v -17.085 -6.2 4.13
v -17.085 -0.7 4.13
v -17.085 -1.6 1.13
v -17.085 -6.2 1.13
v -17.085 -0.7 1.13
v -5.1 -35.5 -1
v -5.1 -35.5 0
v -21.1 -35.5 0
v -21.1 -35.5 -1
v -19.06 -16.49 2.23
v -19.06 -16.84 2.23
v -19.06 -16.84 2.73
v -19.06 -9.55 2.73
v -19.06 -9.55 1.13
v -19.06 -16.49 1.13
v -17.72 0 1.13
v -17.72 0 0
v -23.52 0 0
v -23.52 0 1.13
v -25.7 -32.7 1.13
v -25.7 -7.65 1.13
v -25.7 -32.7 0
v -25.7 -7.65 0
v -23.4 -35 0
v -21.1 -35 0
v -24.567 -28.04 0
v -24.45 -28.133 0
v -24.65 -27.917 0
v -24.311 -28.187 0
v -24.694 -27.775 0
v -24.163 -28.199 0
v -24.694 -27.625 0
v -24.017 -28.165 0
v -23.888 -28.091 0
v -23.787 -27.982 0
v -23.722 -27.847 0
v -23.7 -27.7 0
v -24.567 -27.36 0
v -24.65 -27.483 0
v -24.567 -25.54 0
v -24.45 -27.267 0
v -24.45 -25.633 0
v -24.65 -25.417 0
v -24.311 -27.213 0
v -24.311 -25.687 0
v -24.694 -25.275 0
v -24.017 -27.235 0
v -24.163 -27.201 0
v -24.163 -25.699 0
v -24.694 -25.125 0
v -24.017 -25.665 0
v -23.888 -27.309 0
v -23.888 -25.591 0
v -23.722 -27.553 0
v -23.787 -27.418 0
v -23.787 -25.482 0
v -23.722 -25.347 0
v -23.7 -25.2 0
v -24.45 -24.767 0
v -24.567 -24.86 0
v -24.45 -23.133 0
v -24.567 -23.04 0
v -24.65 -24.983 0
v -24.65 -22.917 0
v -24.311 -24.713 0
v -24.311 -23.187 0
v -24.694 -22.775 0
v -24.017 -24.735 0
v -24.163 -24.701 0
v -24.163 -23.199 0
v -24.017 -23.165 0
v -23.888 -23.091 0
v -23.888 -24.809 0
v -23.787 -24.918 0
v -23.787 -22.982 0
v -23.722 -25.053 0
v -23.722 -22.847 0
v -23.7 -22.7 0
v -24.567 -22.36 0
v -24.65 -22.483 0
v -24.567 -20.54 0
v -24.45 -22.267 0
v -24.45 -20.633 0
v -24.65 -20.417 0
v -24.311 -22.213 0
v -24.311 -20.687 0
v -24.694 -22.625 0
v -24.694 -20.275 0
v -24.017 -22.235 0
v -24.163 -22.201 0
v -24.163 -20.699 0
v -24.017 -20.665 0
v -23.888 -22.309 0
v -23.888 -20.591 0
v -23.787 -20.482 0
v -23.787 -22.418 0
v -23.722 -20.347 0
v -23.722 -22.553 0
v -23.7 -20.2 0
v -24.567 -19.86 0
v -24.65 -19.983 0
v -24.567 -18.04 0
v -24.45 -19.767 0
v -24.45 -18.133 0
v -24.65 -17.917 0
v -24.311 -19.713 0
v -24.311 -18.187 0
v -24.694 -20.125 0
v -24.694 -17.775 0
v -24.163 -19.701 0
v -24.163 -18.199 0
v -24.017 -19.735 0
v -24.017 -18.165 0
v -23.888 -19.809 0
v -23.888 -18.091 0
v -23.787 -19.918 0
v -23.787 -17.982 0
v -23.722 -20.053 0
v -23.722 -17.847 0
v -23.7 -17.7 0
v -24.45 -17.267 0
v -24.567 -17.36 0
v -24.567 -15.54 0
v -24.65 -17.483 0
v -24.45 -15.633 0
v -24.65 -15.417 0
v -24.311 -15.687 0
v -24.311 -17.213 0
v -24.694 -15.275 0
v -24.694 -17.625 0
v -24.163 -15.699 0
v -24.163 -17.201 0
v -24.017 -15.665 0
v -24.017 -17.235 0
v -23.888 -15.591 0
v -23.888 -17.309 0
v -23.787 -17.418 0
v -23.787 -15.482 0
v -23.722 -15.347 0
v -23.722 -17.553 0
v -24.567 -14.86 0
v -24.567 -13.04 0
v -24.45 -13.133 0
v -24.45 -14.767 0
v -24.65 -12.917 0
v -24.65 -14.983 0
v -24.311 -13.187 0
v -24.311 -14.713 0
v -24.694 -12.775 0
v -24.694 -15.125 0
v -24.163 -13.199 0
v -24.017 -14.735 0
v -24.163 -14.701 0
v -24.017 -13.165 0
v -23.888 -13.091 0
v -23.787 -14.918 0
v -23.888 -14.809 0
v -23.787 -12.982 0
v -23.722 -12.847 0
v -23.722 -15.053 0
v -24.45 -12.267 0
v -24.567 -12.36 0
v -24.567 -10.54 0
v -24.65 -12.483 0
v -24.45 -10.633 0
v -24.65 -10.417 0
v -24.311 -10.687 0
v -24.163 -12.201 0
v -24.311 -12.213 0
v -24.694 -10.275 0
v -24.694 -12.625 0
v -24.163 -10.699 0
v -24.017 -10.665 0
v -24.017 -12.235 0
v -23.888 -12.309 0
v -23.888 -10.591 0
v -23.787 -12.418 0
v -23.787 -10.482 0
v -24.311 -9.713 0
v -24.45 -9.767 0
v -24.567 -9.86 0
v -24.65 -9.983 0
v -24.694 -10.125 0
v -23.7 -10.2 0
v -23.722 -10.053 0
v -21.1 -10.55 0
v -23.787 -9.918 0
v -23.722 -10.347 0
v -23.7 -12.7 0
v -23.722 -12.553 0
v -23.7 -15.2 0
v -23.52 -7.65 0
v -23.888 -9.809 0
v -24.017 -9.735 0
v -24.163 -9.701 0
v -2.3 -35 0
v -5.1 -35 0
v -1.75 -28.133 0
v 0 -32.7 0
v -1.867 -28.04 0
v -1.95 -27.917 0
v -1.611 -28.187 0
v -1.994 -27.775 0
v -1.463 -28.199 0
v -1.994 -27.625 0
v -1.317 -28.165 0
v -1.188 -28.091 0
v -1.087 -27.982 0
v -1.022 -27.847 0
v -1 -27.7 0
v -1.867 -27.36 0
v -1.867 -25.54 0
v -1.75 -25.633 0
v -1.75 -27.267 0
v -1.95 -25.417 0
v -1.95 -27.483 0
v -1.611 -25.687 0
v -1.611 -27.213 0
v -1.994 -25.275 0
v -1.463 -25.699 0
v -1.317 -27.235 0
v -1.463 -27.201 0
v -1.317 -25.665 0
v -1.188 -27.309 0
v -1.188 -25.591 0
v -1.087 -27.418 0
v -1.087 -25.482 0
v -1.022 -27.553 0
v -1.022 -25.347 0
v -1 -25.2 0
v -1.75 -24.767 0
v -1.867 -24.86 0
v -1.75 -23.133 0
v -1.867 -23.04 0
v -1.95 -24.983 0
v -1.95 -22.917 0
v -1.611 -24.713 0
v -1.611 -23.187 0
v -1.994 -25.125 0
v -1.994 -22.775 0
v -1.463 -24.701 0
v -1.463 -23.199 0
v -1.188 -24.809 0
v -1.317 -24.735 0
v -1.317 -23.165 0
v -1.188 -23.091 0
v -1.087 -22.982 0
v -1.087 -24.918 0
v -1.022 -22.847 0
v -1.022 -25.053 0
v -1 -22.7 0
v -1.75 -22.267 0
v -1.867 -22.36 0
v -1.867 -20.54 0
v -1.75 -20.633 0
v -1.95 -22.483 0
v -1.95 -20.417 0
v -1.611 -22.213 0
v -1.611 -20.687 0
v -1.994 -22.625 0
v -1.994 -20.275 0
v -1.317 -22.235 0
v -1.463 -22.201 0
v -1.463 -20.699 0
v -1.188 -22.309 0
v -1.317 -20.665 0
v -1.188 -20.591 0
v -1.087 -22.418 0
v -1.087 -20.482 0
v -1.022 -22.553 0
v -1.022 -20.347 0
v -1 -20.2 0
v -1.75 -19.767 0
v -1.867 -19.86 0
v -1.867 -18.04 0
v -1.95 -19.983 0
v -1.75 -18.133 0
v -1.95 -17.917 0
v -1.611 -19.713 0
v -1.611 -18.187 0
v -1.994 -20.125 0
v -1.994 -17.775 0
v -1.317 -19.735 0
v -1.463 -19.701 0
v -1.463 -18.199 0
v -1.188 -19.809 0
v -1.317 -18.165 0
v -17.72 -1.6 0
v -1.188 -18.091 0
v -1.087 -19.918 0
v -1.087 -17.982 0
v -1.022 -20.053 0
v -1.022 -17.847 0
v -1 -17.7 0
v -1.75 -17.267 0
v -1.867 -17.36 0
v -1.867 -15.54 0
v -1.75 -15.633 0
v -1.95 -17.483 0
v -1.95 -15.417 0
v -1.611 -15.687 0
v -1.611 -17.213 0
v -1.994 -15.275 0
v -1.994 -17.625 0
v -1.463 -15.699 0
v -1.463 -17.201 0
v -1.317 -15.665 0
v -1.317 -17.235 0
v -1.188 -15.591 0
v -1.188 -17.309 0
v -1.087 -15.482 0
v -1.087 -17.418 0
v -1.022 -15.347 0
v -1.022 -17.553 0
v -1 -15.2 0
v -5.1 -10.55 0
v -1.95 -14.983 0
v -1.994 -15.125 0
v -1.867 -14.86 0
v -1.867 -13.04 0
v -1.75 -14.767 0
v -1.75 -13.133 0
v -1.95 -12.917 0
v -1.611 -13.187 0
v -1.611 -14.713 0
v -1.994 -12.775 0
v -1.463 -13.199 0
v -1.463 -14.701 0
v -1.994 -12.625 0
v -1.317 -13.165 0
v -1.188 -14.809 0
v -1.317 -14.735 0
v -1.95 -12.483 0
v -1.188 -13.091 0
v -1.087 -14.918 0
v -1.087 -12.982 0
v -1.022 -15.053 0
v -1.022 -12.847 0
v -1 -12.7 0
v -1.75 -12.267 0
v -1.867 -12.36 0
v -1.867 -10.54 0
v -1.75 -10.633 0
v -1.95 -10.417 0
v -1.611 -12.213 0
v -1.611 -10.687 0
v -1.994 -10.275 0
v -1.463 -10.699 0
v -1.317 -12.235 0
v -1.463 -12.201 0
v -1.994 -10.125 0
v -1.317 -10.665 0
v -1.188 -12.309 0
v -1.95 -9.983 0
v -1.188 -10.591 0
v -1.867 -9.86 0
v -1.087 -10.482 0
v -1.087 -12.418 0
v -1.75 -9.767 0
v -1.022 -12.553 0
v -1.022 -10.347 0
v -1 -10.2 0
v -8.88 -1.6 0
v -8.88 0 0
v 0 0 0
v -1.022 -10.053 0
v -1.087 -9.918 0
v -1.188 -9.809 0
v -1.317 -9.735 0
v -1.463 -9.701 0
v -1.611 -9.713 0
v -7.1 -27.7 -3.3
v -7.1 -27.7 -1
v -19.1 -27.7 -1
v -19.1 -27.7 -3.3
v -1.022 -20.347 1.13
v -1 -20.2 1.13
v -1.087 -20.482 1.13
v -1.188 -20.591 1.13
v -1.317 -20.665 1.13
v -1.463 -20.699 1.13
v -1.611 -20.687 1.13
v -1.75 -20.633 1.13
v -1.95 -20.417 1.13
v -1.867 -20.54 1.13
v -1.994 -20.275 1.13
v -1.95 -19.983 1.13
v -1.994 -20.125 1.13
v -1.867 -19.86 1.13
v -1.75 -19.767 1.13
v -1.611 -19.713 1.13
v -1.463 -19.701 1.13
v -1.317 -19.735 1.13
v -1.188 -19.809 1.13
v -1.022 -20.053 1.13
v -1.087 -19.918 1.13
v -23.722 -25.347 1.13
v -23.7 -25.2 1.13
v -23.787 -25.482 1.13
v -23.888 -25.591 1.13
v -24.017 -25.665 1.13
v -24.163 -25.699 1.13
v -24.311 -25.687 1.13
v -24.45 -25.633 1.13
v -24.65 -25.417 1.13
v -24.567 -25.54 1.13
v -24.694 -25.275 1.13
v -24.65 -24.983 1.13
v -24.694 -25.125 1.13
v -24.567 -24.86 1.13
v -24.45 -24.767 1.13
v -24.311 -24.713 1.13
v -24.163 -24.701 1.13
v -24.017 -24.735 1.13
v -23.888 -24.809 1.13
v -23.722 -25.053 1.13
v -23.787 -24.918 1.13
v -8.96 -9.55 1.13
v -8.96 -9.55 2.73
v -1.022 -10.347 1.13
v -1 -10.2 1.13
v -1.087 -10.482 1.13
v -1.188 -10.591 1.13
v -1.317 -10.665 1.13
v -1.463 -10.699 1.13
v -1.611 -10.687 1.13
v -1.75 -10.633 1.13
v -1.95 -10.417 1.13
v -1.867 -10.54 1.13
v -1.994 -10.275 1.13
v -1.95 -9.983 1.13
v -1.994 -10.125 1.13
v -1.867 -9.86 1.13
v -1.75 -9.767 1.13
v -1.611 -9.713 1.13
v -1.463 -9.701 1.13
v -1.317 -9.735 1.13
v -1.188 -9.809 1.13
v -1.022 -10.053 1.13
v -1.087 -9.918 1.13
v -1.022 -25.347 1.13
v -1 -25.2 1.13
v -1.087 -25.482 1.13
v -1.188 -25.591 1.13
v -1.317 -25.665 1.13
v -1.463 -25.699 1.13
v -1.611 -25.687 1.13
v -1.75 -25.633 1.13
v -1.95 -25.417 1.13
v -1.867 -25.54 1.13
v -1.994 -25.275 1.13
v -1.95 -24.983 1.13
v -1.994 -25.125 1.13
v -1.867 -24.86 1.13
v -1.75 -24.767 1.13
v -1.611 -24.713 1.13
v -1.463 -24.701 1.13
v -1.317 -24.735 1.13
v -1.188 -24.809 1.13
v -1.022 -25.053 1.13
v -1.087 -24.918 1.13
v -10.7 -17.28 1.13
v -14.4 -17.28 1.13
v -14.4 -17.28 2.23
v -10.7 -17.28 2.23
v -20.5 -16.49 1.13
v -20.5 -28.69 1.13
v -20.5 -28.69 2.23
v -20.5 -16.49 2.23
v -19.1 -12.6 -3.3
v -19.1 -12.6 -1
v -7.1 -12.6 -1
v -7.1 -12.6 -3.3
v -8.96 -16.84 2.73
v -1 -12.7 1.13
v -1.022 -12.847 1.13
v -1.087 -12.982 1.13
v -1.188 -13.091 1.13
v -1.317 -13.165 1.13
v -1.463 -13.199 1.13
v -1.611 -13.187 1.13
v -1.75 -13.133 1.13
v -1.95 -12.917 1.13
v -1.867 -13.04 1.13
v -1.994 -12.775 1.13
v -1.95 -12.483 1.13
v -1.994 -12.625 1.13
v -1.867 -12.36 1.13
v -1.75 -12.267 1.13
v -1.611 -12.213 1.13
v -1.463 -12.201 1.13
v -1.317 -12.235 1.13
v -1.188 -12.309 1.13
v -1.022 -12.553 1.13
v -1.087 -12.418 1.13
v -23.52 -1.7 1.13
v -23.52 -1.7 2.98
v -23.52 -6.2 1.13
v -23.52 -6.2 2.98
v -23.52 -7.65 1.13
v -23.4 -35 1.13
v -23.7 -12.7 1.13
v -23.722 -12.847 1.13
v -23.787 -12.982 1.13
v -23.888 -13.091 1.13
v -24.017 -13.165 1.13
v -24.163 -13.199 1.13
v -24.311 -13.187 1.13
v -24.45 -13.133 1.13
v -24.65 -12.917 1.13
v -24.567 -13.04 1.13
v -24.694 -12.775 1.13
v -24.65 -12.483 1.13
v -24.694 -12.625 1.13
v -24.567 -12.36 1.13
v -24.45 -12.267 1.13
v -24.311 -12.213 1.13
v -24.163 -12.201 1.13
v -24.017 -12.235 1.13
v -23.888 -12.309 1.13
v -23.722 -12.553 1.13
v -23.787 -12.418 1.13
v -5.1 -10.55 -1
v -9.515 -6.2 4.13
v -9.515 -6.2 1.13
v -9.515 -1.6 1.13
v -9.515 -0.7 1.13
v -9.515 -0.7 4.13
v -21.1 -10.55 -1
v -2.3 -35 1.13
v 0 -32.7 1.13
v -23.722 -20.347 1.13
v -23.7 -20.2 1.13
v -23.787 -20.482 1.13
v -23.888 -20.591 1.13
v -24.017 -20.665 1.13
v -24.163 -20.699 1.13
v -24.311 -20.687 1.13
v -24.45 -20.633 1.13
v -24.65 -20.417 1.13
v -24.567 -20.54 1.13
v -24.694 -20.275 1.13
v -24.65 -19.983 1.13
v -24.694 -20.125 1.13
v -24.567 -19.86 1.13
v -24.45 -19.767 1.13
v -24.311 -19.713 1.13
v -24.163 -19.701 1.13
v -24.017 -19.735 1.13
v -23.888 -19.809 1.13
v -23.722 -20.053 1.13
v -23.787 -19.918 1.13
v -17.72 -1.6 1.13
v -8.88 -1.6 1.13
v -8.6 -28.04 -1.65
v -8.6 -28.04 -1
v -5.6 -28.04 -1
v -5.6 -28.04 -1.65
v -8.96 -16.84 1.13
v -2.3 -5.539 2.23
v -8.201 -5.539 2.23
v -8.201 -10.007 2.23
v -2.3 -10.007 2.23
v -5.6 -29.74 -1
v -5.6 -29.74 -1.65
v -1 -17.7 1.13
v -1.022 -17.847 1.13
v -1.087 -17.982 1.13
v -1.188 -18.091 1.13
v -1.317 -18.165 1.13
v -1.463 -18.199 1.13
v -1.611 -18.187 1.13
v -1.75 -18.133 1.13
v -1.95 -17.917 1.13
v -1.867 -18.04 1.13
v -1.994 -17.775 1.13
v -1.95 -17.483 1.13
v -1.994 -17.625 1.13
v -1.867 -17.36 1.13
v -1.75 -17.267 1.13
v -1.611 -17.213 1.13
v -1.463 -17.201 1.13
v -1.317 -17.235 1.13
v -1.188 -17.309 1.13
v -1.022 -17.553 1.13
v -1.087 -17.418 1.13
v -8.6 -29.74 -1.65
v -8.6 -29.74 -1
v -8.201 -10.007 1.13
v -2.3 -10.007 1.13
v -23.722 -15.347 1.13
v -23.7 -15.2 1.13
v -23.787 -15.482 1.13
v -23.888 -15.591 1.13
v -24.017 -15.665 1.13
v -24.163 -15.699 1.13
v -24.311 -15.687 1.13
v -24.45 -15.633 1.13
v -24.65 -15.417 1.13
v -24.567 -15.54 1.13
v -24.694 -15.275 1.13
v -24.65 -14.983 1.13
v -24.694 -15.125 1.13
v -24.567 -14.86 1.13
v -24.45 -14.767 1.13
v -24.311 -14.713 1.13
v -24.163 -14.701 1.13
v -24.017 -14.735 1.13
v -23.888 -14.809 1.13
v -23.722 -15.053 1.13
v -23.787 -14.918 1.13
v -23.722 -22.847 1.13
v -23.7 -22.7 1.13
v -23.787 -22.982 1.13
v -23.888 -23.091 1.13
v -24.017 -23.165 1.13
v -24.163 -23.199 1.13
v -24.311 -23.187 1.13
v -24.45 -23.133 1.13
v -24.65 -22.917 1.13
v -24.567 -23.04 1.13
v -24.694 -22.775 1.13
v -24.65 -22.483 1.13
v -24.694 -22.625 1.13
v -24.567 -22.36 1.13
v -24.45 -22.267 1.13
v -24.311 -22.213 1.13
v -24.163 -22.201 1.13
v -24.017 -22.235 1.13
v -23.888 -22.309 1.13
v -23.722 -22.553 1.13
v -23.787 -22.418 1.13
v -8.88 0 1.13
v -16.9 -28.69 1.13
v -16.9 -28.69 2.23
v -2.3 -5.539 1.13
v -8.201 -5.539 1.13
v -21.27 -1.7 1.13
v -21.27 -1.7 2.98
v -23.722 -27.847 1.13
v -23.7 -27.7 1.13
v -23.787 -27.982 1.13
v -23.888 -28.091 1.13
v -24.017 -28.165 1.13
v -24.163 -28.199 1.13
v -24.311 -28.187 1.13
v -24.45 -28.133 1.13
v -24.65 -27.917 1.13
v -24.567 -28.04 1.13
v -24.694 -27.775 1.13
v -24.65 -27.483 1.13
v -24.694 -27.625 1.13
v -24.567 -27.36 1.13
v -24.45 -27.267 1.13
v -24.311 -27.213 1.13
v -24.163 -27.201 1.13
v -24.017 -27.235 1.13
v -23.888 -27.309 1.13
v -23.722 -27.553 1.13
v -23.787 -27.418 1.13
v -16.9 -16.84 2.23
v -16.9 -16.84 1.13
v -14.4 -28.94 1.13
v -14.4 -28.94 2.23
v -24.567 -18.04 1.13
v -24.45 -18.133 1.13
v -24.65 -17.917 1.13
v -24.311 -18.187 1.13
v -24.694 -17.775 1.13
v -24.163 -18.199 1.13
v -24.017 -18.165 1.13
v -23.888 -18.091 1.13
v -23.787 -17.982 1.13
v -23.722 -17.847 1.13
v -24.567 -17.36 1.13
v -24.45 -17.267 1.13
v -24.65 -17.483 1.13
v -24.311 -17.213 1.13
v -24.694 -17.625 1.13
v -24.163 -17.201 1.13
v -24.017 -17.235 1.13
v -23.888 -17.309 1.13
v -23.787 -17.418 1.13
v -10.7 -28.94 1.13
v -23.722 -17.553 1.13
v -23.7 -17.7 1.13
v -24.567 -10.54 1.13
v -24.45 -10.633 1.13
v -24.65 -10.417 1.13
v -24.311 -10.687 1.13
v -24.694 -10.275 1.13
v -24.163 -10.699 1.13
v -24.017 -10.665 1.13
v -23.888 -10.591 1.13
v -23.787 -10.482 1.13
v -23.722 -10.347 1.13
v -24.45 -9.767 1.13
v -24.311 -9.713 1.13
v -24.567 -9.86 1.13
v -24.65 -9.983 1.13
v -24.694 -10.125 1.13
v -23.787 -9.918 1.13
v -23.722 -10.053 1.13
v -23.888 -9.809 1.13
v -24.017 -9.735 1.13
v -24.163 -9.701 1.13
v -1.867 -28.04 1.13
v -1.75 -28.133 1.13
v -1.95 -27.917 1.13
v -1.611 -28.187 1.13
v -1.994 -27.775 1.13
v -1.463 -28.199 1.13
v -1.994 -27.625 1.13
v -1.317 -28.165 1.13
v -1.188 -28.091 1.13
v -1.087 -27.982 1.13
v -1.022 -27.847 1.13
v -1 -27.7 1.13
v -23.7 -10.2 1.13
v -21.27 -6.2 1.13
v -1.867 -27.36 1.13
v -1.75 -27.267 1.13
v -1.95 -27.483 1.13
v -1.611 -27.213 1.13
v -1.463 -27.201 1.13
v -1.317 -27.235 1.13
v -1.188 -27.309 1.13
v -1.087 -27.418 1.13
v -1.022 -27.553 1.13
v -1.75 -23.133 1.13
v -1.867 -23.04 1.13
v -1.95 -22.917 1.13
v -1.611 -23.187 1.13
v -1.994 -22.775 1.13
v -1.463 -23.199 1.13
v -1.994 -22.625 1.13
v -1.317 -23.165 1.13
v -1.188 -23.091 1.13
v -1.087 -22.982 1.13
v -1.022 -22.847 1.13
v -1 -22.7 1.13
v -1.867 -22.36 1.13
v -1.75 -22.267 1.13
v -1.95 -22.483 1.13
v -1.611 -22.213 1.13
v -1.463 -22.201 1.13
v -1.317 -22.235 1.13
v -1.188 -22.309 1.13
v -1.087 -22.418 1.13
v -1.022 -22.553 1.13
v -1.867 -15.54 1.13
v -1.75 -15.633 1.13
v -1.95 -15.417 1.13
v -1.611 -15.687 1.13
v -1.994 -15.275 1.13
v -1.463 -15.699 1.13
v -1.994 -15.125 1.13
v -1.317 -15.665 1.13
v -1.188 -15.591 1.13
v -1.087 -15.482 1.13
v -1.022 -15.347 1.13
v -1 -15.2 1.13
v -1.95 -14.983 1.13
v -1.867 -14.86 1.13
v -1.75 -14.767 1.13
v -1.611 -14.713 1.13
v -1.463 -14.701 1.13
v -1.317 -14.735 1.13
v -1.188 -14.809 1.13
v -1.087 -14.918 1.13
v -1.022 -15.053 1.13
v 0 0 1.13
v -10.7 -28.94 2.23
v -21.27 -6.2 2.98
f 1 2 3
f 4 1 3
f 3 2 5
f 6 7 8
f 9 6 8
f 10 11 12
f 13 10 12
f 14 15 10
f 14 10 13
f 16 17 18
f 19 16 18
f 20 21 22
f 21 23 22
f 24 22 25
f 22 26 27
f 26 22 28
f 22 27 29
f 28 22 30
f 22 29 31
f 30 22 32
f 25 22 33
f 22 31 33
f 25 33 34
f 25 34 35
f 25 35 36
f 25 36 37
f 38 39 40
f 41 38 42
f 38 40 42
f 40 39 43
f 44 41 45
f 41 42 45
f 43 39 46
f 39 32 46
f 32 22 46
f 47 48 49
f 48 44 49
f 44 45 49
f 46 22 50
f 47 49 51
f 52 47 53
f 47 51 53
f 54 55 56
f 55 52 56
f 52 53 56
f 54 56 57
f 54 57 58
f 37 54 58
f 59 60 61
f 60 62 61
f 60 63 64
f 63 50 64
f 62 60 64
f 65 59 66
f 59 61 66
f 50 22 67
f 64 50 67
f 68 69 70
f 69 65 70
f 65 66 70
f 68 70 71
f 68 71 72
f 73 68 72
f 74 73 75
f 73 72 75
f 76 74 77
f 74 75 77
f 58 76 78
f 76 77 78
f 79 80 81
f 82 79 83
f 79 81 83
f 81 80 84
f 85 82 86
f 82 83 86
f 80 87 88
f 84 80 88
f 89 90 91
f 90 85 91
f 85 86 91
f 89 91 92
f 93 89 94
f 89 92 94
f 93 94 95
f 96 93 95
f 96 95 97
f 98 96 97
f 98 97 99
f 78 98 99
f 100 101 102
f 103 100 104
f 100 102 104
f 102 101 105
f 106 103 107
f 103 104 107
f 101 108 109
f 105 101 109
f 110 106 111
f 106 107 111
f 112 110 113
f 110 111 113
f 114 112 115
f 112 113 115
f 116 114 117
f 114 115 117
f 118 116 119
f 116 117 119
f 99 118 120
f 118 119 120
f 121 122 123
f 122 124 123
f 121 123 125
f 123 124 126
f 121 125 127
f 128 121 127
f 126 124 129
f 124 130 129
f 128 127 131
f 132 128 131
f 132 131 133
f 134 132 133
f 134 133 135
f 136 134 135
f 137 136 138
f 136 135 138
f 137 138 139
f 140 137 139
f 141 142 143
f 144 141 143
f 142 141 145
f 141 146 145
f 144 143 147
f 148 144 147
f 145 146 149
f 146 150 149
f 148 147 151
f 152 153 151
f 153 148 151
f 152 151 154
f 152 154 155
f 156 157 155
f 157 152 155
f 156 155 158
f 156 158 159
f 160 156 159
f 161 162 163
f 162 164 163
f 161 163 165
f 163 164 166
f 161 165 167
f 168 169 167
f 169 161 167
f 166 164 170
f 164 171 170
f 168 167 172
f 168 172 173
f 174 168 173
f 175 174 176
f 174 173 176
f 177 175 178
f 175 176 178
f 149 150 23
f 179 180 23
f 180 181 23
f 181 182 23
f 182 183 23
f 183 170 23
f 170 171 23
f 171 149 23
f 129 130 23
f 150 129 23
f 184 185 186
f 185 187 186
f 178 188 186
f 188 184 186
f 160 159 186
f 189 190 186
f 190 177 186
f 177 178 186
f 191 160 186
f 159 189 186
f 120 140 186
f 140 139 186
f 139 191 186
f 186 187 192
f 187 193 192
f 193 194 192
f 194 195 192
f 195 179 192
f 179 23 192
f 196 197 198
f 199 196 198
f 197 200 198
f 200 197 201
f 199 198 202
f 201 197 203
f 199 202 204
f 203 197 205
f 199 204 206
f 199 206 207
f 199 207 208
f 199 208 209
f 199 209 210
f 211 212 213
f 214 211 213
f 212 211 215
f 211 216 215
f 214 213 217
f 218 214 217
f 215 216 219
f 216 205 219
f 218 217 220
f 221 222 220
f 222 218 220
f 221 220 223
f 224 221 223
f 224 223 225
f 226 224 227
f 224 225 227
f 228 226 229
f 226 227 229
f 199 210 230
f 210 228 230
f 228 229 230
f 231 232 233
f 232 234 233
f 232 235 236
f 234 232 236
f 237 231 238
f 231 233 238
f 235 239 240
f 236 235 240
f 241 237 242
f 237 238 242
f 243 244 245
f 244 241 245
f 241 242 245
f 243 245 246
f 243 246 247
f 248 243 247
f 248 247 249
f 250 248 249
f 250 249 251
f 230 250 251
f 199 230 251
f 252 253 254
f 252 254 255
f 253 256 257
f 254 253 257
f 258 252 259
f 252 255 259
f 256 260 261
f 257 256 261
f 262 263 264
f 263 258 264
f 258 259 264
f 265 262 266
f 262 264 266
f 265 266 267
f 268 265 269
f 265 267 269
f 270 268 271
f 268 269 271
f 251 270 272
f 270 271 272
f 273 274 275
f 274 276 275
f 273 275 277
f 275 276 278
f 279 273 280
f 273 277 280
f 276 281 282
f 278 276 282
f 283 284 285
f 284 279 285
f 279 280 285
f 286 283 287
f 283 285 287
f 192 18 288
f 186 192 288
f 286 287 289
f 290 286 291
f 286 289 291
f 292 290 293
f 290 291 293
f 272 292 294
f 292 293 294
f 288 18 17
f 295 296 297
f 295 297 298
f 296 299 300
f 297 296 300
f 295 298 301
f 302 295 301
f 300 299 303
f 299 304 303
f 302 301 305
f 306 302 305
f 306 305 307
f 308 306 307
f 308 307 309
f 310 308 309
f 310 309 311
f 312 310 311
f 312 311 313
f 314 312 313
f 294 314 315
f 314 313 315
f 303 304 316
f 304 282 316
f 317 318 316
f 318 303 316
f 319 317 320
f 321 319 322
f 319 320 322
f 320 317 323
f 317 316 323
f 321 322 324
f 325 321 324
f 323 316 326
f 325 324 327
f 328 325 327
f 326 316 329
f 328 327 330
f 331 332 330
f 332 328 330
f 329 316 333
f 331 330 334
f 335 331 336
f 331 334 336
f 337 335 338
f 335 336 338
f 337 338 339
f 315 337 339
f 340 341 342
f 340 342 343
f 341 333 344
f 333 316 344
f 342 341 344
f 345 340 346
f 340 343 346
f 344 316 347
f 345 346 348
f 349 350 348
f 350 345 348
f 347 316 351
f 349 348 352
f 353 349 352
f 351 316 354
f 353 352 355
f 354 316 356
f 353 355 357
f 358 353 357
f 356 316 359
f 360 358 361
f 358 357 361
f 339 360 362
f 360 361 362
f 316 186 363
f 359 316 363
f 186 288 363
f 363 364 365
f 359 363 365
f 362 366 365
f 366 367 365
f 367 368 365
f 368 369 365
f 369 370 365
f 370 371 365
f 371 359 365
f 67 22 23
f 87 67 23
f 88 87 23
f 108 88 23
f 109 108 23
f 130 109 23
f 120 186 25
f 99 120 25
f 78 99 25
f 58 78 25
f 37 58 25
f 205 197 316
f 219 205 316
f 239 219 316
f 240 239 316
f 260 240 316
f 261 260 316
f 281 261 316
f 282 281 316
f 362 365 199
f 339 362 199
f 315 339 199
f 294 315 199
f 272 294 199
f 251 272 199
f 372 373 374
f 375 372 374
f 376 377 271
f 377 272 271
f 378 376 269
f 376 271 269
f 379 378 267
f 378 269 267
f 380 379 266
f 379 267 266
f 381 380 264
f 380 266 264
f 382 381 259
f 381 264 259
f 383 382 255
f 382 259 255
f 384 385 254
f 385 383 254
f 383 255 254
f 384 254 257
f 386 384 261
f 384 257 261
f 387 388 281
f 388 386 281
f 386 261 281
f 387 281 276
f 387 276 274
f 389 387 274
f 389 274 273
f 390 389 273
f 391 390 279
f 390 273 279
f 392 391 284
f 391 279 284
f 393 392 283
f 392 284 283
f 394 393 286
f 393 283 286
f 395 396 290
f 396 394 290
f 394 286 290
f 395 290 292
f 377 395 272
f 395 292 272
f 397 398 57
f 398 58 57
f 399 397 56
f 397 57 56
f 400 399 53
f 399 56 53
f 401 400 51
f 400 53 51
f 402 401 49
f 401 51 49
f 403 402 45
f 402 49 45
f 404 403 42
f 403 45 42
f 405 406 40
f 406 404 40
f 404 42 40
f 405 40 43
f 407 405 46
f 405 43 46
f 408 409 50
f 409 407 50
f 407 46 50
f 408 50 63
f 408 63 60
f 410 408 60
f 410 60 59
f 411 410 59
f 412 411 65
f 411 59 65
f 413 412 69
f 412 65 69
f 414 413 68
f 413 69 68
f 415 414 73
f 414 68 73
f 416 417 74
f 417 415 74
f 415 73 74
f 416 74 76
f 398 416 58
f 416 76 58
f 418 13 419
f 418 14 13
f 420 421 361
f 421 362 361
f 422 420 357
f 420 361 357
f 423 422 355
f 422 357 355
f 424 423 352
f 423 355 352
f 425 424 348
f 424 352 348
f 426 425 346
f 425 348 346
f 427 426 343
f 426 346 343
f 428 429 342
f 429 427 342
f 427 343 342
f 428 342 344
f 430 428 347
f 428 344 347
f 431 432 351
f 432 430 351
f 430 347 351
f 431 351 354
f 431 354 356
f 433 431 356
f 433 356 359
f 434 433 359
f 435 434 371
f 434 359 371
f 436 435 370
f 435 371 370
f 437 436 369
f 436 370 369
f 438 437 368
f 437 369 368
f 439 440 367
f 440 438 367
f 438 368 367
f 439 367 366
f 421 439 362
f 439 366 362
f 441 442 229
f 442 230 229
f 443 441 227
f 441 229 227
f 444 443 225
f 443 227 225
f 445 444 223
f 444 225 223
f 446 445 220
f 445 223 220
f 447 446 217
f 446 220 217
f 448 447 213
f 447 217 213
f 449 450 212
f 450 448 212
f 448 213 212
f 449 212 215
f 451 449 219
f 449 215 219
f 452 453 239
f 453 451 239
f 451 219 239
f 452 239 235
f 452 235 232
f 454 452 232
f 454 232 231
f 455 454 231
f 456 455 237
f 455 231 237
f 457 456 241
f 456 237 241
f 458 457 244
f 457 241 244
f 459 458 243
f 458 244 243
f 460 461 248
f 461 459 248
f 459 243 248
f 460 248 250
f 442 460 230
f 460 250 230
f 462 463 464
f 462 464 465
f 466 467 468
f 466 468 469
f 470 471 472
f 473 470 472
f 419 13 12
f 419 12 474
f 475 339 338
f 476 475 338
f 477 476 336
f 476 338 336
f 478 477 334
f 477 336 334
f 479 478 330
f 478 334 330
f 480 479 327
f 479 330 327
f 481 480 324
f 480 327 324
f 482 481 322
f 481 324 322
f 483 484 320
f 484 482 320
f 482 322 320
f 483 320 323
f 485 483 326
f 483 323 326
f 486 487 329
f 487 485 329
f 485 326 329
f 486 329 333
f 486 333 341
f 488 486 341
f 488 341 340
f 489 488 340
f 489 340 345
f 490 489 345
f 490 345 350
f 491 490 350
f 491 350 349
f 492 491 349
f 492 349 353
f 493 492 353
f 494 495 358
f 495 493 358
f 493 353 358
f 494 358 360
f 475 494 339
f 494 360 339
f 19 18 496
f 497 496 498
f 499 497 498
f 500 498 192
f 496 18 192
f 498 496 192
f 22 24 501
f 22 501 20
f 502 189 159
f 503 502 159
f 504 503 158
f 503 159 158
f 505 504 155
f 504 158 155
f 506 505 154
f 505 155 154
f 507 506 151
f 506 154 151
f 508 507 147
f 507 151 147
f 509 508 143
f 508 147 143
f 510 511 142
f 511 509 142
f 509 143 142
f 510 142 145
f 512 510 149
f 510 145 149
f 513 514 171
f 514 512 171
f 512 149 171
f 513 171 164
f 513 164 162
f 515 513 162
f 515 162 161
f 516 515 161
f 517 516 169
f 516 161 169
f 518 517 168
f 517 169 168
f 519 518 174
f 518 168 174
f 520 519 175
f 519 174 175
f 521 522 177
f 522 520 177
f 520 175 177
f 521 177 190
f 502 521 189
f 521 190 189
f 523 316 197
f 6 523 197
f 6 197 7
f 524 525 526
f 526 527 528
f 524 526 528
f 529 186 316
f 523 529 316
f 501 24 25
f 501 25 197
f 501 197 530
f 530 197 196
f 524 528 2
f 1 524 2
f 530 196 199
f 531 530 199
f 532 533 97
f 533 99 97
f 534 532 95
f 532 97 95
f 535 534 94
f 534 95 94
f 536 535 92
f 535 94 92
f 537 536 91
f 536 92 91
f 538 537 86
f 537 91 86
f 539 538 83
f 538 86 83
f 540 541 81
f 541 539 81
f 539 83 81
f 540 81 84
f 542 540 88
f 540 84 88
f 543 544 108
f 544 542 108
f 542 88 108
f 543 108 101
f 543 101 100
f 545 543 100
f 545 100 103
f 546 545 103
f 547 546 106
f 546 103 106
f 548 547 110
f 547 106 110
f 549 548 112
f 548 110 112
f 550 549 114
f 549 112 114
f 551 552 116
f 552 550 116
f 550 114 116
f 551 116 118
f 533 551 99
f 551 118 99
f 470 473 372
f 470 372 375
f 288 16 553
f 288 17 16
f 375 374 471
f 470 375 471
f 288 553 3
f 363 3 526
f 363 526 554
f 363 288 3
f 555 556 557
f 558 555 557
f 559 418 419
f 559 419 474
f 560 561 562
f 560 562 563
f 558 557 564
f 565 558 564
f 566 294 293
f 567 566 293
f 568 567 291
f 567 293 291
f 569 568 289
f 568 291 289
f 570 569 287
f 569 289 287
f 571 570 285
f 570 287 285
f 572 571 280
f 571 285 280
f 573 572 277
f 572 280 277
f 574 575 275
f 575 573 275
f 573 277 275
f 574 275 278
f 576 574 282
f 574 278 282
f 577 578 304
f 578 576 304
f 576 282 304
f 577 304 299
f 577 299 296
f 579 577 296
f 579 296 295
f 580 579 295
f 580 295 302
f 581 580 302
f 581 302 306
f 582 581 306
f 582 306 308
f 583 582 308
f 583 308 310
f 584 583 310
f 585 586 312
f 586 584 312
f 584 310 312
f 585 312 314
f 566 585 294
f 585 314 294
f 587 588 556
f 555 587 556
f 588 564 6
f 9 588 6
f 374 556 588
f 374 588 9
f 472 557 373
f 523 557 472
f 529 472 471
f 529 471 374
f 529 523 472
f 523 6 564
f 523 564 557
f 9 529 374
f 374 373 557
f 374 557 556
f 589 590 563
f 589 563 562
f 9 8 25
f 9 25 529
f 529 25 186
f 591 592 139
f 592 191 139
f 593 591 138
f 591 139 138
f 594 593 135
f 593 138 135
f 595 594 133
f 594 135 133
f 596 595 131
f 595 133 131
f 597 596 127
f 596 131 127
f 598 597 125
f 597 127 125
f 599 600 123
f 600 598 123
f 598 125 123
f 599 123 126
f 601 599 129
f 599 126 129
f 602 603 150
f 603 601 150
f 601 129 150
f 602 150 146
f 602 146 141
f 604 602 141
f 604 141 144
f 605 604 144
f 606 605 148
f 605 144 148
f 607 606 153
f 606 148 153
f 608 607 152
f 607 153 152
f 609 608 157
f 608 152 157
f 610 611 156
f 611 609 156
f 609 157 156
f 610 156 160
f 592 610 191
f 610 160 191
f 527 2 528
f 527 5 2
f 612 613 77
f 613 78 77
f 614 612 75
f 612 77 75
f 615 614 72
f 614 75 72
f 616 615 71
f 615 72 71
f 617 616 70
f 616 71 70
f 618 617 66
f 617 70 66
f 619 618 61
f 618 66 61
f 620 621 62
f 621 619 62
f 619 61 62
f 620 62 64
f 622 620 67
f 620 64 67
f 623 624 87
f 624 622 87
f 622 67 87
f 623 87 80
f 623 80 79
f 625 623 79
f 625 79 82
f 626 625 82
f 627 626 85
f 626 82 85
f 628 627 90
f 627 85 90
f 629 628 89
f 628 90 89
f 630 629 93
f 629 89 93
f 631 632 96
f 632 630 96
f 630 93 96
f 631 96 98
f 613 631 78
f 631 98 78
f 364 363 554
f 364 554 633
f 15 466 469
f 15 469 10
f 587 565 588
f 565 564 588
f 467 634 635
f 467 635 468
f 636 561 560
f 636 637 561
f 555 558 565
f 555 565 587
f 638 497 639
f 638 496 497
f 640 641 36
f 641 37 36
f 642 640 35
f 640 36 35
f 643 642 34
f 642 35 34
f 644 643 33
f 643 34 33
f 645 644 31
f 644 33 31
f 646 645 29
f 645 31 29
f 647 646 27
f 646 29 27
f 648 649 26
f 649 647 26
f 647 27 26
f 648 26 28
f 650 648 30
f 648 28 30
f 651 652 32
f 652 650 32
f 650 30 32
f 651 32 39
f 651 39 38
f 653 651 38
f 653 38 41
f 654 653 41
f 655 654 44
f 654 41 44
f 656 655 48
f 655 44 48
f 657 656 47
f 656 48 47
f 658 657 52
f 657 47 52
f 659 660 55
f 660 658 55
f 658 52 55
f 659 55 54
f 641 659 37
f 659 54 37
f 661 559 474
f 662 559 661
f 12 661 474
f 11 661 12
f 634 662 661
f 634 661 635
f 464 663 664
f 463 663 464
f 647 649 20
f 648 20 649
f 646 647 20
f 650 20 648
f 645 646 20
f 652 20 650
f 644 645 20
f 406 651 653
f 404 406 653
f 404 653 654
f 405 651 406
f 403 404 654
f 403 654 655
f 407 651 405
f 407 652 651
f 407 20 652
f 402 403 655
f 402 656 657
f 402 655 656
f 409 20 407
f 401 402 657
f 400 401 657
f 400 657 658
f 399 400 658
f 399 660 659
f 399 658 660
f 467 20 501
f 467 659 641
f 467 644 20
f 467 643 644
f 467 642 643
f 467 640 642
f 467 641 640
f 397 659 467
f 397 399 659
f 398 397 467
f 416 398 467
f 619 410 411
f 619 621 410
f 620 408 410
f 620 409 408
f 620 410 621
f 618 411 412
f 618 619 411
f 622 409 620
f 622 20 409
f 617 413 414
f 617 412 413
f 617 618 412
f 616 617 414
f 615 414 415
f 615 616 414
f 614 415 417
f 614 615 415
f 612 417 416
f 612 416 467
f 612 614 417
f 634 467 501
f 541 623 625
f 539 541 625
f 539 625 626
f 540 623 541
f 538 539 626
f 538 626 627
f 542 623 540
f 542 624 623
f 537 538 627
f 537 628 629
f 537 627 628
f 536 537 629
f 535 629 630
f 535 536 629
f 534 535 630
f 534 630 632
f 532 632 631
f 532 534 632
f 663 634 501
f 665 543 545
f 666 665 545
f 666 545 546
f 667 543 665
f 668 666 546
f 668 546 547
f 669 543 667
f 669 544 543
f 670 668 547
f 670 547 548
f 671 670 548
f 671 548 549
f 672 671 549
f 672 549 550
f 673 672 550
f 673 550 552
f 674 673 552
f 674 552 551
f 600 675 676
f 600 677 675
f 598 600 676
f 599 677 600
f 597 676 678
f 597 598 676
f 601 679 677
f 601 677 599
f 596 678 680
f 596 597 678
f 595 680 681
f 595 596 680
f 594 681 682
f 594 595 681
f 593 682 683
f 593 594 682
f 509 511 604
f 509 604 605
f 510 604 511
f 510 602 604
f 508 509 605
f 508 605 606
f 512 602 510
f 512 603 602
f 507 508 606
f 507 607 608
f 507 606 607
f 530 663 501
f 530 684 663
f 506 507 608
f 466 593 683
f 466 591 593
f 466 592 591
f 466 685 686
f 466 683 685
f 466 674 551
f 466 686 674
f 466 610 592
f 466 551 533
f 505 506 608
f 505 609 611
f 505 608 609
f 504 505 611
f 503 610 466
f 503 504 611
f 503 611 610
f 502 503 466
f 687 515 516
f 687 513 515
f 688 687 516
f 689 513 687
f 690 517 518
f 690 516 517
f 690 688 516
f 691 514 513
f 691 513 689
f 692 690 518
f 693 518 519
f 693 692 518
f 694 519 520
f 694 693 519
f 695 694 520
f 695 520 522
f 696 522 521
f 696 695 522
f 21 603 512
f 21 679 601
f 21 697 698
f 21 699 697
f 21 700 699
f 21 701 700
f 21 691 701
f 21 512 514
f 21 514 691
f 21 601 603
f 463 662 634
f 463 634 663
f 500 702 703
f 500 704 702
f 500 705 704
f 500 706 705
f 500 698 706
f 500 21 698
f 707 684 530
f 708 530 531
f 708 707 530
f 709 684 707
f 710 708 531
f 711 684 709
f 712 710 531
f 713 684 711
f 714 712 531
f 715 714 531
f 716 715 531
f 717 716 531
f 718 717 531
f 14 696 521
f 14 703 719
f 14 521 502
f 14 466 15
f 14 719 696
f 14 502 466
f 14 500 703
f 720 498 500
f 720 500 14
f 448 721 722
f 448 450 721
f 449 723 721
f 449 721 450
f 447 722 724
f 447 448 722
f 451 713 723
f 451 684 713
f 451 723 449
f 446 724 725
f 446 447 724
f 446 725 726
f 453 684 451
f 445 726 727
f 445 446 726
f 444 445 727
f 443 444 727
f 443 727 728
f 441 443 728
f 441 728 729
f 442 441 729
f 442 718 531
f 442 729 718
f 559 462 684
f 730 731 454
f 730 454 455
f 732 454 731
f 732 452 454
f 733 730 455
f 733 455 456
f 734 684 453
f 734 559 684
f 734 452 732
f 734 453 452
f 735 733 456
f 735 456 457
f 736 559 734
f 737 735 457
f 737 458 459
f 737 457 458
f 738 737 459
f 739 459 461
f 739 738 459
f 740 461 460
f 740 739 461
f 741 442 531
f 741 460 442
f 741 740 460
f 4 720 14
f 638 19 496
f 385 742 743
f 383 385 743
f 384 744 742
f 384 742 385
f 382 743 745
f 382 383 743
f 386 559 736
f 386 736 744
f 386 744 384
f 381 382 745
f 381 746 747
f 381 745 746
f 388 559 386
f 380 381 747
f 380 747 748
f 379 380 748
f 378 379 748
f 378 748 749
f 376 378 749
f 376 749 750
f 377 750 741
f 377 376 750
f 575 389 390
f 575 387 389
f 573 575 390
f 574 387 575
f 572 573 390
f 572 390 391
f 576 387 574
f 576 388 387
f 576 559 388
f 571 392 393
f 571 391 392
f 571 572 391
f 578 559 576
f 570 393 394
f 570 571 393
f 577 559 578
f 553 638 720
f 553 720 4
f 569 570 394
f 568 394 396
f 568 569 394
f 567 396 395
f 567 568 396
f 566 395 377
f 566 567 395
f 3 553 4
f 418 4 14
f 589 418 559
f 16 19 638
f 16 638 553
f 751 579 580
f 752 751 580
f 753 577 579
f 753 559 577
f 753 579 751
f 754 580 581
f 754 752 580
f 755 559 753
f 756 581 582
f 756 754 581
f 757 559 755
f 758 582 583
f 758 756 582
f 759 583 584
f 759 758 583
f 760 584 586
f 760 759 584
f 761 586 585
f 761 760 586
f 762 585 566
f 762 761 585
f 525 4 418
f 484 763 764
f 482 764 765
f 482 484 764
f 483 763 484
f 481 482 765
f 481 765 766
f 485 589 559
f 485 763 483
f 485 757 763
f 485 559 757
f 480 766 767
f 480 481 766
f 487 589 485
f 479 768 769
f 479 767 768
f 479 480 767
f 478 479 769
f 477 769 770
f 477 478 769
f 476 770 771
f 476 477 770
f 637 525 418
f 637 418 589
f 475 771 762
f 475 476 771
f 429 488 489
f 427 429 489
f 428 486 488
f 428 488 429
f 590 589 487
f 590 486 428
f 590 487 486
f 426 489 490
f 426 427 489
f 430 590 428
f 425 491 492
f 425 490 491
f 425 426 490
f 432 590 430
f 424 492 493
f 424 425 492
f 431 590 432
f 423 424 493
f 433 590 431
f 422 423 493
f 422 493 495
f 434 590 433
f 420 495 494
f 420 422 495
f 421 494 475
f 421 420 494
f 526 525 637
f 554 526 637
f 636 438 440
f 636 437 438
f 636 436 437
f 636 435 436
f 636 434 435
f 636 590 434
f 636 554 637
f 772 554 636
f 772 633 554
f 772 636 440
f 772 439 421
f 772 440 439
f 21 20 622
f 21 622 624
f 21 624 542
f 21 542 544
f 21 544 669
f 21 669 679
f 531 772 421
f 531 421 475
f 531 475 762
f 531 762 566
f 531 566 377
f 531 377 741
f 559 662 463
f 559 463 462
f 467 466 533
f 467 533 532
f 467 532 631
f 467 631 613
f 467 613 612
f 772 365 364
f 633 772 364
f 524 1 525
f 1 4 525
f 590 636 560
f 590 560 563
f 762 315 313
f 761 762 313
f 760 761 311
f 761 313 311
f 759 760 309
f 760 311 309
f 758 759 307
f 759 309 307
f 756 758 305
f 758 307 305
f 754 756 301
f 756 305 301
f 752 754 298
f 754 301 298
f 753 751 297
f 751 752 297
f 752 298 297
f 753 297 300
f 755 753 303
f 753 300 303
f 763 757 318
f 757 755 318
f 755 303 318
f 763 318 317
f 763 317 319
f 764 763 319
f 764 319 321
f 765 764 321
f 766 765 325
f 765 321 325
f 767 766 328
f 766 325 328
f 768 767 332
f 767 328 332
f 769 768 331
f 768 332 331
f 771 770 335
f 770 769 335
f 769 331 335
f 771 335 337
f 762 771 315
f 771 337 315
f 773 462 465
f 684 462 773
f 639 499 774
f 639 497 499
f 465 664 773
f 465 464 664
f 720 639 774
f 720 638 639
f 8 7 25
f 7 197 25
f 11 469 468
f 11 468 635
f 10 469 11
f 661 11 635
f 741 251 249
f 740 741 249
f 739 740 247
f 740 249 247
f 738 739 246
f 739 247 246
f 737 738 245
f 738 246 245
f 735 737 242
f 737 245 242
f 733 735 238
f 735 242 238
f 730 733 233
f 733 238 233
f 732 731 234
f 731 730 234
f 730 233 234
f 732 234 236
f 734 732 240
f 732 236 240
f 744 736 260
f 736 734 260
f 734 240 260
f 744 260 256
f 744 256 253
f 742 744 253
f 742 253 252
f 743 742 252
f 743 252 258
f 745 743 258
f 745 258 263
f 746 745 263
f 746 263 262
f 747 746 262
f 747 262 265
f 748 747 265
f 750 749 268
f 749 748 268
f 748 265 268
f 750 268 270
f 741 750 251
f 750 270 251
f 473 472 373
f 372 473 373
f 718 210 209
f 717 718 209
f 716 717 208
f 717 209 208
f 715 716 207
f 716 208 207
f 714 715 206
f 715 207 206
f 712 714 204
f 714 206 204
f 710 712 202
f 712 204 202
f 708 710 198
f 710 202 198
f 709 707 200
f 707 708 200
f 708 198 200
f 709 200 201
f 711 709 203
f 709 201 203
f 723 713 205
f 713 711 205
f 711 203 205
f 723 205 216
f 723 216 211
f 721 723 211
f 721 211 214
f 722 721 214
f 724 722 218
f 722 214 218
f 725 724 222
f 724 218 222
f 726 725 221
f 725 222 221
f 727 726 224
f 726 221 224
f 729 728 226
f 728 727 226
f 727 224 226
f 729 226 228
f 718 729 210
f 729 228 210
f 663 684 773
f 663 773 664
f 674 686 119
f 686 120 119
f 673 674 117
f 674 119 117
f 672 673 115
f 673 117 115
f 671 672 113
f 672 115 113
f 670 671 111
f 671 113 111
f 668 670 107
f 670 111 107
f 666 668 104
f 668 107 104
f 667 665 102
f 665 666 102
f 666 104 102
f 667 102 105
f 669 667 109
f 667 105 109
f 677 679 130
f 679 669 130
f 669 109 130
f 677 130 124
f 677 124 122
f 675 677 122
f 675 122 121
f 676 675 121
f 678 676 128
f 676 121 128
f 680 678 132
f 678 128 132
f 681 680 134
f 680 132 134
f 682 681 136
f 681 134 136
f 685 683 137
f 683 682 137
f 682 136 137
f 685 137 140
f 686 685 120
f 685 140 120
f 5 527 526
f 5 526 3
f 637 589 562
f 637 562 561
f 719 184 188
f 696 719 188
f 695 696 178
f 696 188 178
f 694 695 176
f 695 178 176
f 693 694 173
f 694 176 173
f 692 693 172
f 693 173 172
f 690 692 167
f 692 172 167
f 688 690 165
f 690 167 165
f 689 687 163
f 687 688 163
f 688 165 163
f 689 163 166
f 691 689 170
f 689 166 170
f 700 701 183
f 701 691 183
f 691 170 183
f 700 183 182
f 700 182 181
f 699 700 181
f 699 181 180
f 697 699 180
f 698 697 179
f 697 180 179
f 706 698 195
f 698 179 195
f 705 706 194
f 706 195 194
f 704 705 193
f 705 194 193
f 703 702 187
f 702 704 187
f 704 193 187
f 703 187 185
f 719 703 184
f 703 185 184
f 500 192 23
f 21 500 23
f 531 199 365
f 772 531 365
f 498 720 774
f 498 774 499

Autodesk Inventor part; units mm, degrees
ref_plane "YZ Plane" through (0, 0, 0) normal (1, 0, 0) x (0, 1, 0)
ref_plane "XZ Plane" through (0, 0, 0) normal (0, 1, 0) x (-1, 0, 0)
ref_plane "XY Plane" through (0, 0, 0) normal (0, 0, 1) x (1, 0, 0)
sketch "Sketch1" plane through (0, 0, 0) normal (0, 0, 1) x (1, 0, 0)
  line L0 (0, 0) -> (-25.7, 0)
  line L1 (-25.7, 0) -> (-25.7, -35)
  line L2 (-25.7, -35) -> (0, -35)
  line L3 (0, -35) -> (0, 0)
  line L4 (-25.7, 0) -> (-23.52, 0)
  line L5 (-23.52, 0) -> (-23.52, -7.65)
  line L6 (-23.52, -7.65) -> (-25.7, -7.65)
  line L7 (-25.7, -7.65) -> (-25.7, 0)
  line L8 (-8.88, 0) -> (-17.72, 0)
  line L9 (-17.72, 0) -> (-17.72, -1.6)
  line L10 (-17.72, -1.6) -> (-8.88, -1.6)
  line L11 (-8.88, -1.6) -> (-8.88, 0)
  circle A0 centre (-24.2, -27.7) radius 0.5
  circle A1 centre (-24.2, -25.2) radius 0.5
  circle A2 centre (-24.2, -22.7) radius 0.5
  circle A3 centre (-24.2, -20.2) radius 0.5
  circle A4 centre (-24.2, -17.7) radius 0.5
  circle A5 centre (-24.2, -15.2) radius 0.5
  circle A6 centre (-24.2, -12.7) radius 0.5
  circle A7 centre (-24.2, -10.2) radius 0.5
  line L12 (-12.85, -35) -> (-12.85, 0) construction
  circle A8 centre (-1.5, -27.7) radius 0.5
  circle A9 centre (-1.5, -25.2) radius 0.5
  circle A10 centre (-1.5, -22.7) radius 0.5
  circle A11 centre (-1.5, -20.2) radius 0.5
  circle A12 centre (-1.5, -17.7) radius 0.5
  circle A13 centre (-1.5, -15.2) radius 0.5
  circle A14 centre (-1.5, -12.7) radius 0.5
  circle A15 centre (-1.5, -10.2) radius 0.5
  line L13 (-23.4, -35) -> (-25.7, -32.7)
  line L14 (-2.3, -35) -> (0, -32.7)
  dimension "d0" = 25.7
  dimension "d1" = 35
  dimension "d4" = 2.18
  dimension "d5" = 7.65
  dimension "d7" = 5.8
  dimension "d8" = 8.88
  dimension "d9" = 1.6
  dimension "d10" = 1
  dimension "d11" = 1.5
  dimension "d12" = 7.3
  dimension "d15" = 2.5
  dimension "d20" = 2.3
  dimension "d21" = 2.3
extrude "Extrusion2" add sketch "Sketch1" along normal blind 1.13 contours L3 L14 L2 L13 L1 L6 L5 L0 L9 L10 L11
ref_plane "Work Plane1" through (-17.72, -0.7, 0) normal (0, 1, 0) x (1, 0, 0)
sketch "Sketch2" plane through (-17.72, -0.7, 0) normal (0, 1, 0) x (1, 0, 0)
  line L0 (8.84, 0) -> (0, 0) projected
  line L1 (0, 0) -> (0, -1.13) projected
  line L2 (8.84, -1.13) -> (0, -1.13) projected
  line L3 (8.84, 0) -> (8.84, -1.13) projected
  line L4 (8.205, -4.13) -> (0.635, -4.13)
  line L5 (0.635, -4.13) -> (0.635, -1.13)
  line L6 (0.635, -1.13) -> (8.205, -1.13)
  line L7 (8.205, -1.13) -> (8.205, -4.13)
  point P0 (17.72, 0)
  point P1 (4.42, -4.13)
  point P2 (4.42, -1.13)
  dimension "d25" = 7.57
  dimension "d26" = 3
  dimension "d27" = 0
  dimension "d28" = 0
extrude "Extrusion3" add sketch "Sketch2" against normal blind 5.5 contours L7 L4 L5 L2
sketch "Sketch3" plane through (0, 0, 0) normal (0, 0, -1) x (-1, 0, 0)
  line L0 (21.1, -10.55) -> (5.1, -10.55)
  line L1 (5.1, -10.55) -> (5.1, -35.5)
  line L2 (5.1, -35.5) -> (21.1, -35.5)
  line L3 (21.1, -35.5) -> (21.1, -10.55)
  line L4 (0, 0) -> (8.88, 0) projected
  line L5 (0, -32.7) -> (0, 0) projected
  line L6 (23.4, -35) -> (2.3, -35) projected
  point P0 (5.1, -35)
  point P1 (21.1, -35)
  dimension "d31" = 10.55
  dimension "d32" = 16
  dimension "d33" = 5.1
  dimension "d34" = 0.5
extrude "Extrusion4" add sketch "Sketch3" along normal blind 1
sketch "Sketch4" plane through (0, 0, -1) normal (0, 0, -1) x (-1, 0, 0)
  line L0 (19.1, -12.6) -> (7.1, -12.6)
  line L1 (7.1, -12.6) -> (7.1, -27.7)
  line L2 (7.1, -27.7) -> (19.1, -27.7)
  line L3 (19.1, -27.7) -> (19.1, -12.6)
  line L4 (5.1, -35.5) -> (21.1, -35.5) projected
  line L5 (21.1, -35.5) -> (21.1, -10.55) projected
  point P0 (0, 0)
  dimension "d37" = 12
  dimension "d38" = 15.1
  dimension "d39" = 7.8
  dimension "d40" = 2
extrude "Extrusion5" add sketch "Sketch4" along normal blind 2.3
sketch "Sketch5" plane through (0, 0, 1.13) normal (0, 0, 1) x (1, 0, 0)
  line L0 (-23.52, 0) -> (-23.52, -7.65) projected
  line L1 (-23.52, -1.7) -> (-21.27, -1.7)
  line L2 (-21.27, -1.7) -> (-21.27, -6.2)
  line L3 (-21.27, -6.2) -> (-23.52, -6.2)
  line L4 (-23.52, -6.2) -> (-23.52, -1.7)
  line L5 (-17.72, 0) -> (-23.52, 0) projected
  line L6 (-20.5, -16.49) -> (-16.9, -16.49)
  line L7 (-16.9, -16.49) -> (-16.9, -28.69)
  line L8 (-16.9, -28.69) -> (-20.5, -28.69)
  line L9 (-20.5, -28.69) -> (-20.5, -16.49)
  line L10 (-23.4, -35) -> (-2.3, -35) projected
  line L11 (-25.7, -7.65) -> (-25.7, -32.7) projected
  line L12 (-19.06, -9.55) -> (-8.96, -9.55)
  line L13 (-8.96, -9.55) -> (-8.96, -16.84)
  line L14 (-8.96, -16.84) -> (-19.06, -16.84)
  line L15 (-19.06, -16.84) -> (-19.06, -9.55)
  line L16 (-5.1, -35.5) -> (-21.1, -35.5) projected
  line L17 (-14.4, -17.28) -> (-10.7, -17.28)
  line L18 (-10.7, -17.28) -> (-10.7, -28.94)
  line L19 (-10.7, -28.94) -> (-14.4, -28.94)
  line L20 (-14.4, -28.94) -> (-14.4, -17.28)
  line L21 (-8.2009, -5.539) -> (-2.3, -5.539)
  line L22 (-2.3, -5.539) -> (-2.3, -10.0071)
  line L23 (-2.3, -10.0071) -> (-8.2009, -10.0071)
  line L24 (-8.2009, -10.0071) -> (-8.2009, -5.539)
  point P0 (0, 0)
  point P1 (-22.395, -1.7)
  point P2 (-16.9, -16.84)
  point P3 (-19.06, -16.49)
  dimension "d43" = 1.7
  dimension "d44" = 2.25
  dimension "d45" = 4.5
  dimension "d46" = 6.31
  dimension "d47" = 3.6
  dimension "d48" = 5.2
  dimension "d49" = 12.2
  dimension "d50" = 6.64
  dimension "d51" = 7.29
  dimension "d52" = 18.66
  dimension "d53" = 6.56
  dimension "d54" = 11.66
  dimension "d55" = 3.7
  dimension "d56" = 15
  dimension "d57" = 10.1
extrude "Extrusion6" add sketch "Sketch5" along normal blind 1.85 contours L1 L2 L3 L0
extrude "Extrusion7" add sketch "Sketch5" along normal blind 1.1 contours L6 L15 L14 L7 L8 L9 | L17 L18 L19 L20 | L21 L22 L23 L24
extrude "Extrusion8" add sketch "Sketch5" along normal blind 1.6 contours L15 L12 L13 L14 L7 L6 | L6 L7 L14 L15
sketch "Sketch6" plane through (0, 0, -1) normal (0, 0, -1) x (-1, 0, 0)
  line L0 (8.6, -28.04) -> (5.6, -28.04)
  line L1 (5.6, -28.04) -> (5.6, -29.74)
  line L2 (5.6, -29.74) -> (8.6, -29.74)
  line L3 (8.6, -29.74) -> (8.6, -28.04)
  line L4 (5.1, -35.5) -> (21.1, -35.5) projected
  line L5 (5.1, -10.55) -> (5.1, -35.5) projected
  point P0 (0, 0)
  dimension "d64" = 3
  dimension "d65" = 5.76
  dimension "d66" = 1.7
  dimension "d67" = 0.5
extrude "Extrusion9" add sketch "Sketch6" along normal blind 0.65
properties part number "ESP-12F"
